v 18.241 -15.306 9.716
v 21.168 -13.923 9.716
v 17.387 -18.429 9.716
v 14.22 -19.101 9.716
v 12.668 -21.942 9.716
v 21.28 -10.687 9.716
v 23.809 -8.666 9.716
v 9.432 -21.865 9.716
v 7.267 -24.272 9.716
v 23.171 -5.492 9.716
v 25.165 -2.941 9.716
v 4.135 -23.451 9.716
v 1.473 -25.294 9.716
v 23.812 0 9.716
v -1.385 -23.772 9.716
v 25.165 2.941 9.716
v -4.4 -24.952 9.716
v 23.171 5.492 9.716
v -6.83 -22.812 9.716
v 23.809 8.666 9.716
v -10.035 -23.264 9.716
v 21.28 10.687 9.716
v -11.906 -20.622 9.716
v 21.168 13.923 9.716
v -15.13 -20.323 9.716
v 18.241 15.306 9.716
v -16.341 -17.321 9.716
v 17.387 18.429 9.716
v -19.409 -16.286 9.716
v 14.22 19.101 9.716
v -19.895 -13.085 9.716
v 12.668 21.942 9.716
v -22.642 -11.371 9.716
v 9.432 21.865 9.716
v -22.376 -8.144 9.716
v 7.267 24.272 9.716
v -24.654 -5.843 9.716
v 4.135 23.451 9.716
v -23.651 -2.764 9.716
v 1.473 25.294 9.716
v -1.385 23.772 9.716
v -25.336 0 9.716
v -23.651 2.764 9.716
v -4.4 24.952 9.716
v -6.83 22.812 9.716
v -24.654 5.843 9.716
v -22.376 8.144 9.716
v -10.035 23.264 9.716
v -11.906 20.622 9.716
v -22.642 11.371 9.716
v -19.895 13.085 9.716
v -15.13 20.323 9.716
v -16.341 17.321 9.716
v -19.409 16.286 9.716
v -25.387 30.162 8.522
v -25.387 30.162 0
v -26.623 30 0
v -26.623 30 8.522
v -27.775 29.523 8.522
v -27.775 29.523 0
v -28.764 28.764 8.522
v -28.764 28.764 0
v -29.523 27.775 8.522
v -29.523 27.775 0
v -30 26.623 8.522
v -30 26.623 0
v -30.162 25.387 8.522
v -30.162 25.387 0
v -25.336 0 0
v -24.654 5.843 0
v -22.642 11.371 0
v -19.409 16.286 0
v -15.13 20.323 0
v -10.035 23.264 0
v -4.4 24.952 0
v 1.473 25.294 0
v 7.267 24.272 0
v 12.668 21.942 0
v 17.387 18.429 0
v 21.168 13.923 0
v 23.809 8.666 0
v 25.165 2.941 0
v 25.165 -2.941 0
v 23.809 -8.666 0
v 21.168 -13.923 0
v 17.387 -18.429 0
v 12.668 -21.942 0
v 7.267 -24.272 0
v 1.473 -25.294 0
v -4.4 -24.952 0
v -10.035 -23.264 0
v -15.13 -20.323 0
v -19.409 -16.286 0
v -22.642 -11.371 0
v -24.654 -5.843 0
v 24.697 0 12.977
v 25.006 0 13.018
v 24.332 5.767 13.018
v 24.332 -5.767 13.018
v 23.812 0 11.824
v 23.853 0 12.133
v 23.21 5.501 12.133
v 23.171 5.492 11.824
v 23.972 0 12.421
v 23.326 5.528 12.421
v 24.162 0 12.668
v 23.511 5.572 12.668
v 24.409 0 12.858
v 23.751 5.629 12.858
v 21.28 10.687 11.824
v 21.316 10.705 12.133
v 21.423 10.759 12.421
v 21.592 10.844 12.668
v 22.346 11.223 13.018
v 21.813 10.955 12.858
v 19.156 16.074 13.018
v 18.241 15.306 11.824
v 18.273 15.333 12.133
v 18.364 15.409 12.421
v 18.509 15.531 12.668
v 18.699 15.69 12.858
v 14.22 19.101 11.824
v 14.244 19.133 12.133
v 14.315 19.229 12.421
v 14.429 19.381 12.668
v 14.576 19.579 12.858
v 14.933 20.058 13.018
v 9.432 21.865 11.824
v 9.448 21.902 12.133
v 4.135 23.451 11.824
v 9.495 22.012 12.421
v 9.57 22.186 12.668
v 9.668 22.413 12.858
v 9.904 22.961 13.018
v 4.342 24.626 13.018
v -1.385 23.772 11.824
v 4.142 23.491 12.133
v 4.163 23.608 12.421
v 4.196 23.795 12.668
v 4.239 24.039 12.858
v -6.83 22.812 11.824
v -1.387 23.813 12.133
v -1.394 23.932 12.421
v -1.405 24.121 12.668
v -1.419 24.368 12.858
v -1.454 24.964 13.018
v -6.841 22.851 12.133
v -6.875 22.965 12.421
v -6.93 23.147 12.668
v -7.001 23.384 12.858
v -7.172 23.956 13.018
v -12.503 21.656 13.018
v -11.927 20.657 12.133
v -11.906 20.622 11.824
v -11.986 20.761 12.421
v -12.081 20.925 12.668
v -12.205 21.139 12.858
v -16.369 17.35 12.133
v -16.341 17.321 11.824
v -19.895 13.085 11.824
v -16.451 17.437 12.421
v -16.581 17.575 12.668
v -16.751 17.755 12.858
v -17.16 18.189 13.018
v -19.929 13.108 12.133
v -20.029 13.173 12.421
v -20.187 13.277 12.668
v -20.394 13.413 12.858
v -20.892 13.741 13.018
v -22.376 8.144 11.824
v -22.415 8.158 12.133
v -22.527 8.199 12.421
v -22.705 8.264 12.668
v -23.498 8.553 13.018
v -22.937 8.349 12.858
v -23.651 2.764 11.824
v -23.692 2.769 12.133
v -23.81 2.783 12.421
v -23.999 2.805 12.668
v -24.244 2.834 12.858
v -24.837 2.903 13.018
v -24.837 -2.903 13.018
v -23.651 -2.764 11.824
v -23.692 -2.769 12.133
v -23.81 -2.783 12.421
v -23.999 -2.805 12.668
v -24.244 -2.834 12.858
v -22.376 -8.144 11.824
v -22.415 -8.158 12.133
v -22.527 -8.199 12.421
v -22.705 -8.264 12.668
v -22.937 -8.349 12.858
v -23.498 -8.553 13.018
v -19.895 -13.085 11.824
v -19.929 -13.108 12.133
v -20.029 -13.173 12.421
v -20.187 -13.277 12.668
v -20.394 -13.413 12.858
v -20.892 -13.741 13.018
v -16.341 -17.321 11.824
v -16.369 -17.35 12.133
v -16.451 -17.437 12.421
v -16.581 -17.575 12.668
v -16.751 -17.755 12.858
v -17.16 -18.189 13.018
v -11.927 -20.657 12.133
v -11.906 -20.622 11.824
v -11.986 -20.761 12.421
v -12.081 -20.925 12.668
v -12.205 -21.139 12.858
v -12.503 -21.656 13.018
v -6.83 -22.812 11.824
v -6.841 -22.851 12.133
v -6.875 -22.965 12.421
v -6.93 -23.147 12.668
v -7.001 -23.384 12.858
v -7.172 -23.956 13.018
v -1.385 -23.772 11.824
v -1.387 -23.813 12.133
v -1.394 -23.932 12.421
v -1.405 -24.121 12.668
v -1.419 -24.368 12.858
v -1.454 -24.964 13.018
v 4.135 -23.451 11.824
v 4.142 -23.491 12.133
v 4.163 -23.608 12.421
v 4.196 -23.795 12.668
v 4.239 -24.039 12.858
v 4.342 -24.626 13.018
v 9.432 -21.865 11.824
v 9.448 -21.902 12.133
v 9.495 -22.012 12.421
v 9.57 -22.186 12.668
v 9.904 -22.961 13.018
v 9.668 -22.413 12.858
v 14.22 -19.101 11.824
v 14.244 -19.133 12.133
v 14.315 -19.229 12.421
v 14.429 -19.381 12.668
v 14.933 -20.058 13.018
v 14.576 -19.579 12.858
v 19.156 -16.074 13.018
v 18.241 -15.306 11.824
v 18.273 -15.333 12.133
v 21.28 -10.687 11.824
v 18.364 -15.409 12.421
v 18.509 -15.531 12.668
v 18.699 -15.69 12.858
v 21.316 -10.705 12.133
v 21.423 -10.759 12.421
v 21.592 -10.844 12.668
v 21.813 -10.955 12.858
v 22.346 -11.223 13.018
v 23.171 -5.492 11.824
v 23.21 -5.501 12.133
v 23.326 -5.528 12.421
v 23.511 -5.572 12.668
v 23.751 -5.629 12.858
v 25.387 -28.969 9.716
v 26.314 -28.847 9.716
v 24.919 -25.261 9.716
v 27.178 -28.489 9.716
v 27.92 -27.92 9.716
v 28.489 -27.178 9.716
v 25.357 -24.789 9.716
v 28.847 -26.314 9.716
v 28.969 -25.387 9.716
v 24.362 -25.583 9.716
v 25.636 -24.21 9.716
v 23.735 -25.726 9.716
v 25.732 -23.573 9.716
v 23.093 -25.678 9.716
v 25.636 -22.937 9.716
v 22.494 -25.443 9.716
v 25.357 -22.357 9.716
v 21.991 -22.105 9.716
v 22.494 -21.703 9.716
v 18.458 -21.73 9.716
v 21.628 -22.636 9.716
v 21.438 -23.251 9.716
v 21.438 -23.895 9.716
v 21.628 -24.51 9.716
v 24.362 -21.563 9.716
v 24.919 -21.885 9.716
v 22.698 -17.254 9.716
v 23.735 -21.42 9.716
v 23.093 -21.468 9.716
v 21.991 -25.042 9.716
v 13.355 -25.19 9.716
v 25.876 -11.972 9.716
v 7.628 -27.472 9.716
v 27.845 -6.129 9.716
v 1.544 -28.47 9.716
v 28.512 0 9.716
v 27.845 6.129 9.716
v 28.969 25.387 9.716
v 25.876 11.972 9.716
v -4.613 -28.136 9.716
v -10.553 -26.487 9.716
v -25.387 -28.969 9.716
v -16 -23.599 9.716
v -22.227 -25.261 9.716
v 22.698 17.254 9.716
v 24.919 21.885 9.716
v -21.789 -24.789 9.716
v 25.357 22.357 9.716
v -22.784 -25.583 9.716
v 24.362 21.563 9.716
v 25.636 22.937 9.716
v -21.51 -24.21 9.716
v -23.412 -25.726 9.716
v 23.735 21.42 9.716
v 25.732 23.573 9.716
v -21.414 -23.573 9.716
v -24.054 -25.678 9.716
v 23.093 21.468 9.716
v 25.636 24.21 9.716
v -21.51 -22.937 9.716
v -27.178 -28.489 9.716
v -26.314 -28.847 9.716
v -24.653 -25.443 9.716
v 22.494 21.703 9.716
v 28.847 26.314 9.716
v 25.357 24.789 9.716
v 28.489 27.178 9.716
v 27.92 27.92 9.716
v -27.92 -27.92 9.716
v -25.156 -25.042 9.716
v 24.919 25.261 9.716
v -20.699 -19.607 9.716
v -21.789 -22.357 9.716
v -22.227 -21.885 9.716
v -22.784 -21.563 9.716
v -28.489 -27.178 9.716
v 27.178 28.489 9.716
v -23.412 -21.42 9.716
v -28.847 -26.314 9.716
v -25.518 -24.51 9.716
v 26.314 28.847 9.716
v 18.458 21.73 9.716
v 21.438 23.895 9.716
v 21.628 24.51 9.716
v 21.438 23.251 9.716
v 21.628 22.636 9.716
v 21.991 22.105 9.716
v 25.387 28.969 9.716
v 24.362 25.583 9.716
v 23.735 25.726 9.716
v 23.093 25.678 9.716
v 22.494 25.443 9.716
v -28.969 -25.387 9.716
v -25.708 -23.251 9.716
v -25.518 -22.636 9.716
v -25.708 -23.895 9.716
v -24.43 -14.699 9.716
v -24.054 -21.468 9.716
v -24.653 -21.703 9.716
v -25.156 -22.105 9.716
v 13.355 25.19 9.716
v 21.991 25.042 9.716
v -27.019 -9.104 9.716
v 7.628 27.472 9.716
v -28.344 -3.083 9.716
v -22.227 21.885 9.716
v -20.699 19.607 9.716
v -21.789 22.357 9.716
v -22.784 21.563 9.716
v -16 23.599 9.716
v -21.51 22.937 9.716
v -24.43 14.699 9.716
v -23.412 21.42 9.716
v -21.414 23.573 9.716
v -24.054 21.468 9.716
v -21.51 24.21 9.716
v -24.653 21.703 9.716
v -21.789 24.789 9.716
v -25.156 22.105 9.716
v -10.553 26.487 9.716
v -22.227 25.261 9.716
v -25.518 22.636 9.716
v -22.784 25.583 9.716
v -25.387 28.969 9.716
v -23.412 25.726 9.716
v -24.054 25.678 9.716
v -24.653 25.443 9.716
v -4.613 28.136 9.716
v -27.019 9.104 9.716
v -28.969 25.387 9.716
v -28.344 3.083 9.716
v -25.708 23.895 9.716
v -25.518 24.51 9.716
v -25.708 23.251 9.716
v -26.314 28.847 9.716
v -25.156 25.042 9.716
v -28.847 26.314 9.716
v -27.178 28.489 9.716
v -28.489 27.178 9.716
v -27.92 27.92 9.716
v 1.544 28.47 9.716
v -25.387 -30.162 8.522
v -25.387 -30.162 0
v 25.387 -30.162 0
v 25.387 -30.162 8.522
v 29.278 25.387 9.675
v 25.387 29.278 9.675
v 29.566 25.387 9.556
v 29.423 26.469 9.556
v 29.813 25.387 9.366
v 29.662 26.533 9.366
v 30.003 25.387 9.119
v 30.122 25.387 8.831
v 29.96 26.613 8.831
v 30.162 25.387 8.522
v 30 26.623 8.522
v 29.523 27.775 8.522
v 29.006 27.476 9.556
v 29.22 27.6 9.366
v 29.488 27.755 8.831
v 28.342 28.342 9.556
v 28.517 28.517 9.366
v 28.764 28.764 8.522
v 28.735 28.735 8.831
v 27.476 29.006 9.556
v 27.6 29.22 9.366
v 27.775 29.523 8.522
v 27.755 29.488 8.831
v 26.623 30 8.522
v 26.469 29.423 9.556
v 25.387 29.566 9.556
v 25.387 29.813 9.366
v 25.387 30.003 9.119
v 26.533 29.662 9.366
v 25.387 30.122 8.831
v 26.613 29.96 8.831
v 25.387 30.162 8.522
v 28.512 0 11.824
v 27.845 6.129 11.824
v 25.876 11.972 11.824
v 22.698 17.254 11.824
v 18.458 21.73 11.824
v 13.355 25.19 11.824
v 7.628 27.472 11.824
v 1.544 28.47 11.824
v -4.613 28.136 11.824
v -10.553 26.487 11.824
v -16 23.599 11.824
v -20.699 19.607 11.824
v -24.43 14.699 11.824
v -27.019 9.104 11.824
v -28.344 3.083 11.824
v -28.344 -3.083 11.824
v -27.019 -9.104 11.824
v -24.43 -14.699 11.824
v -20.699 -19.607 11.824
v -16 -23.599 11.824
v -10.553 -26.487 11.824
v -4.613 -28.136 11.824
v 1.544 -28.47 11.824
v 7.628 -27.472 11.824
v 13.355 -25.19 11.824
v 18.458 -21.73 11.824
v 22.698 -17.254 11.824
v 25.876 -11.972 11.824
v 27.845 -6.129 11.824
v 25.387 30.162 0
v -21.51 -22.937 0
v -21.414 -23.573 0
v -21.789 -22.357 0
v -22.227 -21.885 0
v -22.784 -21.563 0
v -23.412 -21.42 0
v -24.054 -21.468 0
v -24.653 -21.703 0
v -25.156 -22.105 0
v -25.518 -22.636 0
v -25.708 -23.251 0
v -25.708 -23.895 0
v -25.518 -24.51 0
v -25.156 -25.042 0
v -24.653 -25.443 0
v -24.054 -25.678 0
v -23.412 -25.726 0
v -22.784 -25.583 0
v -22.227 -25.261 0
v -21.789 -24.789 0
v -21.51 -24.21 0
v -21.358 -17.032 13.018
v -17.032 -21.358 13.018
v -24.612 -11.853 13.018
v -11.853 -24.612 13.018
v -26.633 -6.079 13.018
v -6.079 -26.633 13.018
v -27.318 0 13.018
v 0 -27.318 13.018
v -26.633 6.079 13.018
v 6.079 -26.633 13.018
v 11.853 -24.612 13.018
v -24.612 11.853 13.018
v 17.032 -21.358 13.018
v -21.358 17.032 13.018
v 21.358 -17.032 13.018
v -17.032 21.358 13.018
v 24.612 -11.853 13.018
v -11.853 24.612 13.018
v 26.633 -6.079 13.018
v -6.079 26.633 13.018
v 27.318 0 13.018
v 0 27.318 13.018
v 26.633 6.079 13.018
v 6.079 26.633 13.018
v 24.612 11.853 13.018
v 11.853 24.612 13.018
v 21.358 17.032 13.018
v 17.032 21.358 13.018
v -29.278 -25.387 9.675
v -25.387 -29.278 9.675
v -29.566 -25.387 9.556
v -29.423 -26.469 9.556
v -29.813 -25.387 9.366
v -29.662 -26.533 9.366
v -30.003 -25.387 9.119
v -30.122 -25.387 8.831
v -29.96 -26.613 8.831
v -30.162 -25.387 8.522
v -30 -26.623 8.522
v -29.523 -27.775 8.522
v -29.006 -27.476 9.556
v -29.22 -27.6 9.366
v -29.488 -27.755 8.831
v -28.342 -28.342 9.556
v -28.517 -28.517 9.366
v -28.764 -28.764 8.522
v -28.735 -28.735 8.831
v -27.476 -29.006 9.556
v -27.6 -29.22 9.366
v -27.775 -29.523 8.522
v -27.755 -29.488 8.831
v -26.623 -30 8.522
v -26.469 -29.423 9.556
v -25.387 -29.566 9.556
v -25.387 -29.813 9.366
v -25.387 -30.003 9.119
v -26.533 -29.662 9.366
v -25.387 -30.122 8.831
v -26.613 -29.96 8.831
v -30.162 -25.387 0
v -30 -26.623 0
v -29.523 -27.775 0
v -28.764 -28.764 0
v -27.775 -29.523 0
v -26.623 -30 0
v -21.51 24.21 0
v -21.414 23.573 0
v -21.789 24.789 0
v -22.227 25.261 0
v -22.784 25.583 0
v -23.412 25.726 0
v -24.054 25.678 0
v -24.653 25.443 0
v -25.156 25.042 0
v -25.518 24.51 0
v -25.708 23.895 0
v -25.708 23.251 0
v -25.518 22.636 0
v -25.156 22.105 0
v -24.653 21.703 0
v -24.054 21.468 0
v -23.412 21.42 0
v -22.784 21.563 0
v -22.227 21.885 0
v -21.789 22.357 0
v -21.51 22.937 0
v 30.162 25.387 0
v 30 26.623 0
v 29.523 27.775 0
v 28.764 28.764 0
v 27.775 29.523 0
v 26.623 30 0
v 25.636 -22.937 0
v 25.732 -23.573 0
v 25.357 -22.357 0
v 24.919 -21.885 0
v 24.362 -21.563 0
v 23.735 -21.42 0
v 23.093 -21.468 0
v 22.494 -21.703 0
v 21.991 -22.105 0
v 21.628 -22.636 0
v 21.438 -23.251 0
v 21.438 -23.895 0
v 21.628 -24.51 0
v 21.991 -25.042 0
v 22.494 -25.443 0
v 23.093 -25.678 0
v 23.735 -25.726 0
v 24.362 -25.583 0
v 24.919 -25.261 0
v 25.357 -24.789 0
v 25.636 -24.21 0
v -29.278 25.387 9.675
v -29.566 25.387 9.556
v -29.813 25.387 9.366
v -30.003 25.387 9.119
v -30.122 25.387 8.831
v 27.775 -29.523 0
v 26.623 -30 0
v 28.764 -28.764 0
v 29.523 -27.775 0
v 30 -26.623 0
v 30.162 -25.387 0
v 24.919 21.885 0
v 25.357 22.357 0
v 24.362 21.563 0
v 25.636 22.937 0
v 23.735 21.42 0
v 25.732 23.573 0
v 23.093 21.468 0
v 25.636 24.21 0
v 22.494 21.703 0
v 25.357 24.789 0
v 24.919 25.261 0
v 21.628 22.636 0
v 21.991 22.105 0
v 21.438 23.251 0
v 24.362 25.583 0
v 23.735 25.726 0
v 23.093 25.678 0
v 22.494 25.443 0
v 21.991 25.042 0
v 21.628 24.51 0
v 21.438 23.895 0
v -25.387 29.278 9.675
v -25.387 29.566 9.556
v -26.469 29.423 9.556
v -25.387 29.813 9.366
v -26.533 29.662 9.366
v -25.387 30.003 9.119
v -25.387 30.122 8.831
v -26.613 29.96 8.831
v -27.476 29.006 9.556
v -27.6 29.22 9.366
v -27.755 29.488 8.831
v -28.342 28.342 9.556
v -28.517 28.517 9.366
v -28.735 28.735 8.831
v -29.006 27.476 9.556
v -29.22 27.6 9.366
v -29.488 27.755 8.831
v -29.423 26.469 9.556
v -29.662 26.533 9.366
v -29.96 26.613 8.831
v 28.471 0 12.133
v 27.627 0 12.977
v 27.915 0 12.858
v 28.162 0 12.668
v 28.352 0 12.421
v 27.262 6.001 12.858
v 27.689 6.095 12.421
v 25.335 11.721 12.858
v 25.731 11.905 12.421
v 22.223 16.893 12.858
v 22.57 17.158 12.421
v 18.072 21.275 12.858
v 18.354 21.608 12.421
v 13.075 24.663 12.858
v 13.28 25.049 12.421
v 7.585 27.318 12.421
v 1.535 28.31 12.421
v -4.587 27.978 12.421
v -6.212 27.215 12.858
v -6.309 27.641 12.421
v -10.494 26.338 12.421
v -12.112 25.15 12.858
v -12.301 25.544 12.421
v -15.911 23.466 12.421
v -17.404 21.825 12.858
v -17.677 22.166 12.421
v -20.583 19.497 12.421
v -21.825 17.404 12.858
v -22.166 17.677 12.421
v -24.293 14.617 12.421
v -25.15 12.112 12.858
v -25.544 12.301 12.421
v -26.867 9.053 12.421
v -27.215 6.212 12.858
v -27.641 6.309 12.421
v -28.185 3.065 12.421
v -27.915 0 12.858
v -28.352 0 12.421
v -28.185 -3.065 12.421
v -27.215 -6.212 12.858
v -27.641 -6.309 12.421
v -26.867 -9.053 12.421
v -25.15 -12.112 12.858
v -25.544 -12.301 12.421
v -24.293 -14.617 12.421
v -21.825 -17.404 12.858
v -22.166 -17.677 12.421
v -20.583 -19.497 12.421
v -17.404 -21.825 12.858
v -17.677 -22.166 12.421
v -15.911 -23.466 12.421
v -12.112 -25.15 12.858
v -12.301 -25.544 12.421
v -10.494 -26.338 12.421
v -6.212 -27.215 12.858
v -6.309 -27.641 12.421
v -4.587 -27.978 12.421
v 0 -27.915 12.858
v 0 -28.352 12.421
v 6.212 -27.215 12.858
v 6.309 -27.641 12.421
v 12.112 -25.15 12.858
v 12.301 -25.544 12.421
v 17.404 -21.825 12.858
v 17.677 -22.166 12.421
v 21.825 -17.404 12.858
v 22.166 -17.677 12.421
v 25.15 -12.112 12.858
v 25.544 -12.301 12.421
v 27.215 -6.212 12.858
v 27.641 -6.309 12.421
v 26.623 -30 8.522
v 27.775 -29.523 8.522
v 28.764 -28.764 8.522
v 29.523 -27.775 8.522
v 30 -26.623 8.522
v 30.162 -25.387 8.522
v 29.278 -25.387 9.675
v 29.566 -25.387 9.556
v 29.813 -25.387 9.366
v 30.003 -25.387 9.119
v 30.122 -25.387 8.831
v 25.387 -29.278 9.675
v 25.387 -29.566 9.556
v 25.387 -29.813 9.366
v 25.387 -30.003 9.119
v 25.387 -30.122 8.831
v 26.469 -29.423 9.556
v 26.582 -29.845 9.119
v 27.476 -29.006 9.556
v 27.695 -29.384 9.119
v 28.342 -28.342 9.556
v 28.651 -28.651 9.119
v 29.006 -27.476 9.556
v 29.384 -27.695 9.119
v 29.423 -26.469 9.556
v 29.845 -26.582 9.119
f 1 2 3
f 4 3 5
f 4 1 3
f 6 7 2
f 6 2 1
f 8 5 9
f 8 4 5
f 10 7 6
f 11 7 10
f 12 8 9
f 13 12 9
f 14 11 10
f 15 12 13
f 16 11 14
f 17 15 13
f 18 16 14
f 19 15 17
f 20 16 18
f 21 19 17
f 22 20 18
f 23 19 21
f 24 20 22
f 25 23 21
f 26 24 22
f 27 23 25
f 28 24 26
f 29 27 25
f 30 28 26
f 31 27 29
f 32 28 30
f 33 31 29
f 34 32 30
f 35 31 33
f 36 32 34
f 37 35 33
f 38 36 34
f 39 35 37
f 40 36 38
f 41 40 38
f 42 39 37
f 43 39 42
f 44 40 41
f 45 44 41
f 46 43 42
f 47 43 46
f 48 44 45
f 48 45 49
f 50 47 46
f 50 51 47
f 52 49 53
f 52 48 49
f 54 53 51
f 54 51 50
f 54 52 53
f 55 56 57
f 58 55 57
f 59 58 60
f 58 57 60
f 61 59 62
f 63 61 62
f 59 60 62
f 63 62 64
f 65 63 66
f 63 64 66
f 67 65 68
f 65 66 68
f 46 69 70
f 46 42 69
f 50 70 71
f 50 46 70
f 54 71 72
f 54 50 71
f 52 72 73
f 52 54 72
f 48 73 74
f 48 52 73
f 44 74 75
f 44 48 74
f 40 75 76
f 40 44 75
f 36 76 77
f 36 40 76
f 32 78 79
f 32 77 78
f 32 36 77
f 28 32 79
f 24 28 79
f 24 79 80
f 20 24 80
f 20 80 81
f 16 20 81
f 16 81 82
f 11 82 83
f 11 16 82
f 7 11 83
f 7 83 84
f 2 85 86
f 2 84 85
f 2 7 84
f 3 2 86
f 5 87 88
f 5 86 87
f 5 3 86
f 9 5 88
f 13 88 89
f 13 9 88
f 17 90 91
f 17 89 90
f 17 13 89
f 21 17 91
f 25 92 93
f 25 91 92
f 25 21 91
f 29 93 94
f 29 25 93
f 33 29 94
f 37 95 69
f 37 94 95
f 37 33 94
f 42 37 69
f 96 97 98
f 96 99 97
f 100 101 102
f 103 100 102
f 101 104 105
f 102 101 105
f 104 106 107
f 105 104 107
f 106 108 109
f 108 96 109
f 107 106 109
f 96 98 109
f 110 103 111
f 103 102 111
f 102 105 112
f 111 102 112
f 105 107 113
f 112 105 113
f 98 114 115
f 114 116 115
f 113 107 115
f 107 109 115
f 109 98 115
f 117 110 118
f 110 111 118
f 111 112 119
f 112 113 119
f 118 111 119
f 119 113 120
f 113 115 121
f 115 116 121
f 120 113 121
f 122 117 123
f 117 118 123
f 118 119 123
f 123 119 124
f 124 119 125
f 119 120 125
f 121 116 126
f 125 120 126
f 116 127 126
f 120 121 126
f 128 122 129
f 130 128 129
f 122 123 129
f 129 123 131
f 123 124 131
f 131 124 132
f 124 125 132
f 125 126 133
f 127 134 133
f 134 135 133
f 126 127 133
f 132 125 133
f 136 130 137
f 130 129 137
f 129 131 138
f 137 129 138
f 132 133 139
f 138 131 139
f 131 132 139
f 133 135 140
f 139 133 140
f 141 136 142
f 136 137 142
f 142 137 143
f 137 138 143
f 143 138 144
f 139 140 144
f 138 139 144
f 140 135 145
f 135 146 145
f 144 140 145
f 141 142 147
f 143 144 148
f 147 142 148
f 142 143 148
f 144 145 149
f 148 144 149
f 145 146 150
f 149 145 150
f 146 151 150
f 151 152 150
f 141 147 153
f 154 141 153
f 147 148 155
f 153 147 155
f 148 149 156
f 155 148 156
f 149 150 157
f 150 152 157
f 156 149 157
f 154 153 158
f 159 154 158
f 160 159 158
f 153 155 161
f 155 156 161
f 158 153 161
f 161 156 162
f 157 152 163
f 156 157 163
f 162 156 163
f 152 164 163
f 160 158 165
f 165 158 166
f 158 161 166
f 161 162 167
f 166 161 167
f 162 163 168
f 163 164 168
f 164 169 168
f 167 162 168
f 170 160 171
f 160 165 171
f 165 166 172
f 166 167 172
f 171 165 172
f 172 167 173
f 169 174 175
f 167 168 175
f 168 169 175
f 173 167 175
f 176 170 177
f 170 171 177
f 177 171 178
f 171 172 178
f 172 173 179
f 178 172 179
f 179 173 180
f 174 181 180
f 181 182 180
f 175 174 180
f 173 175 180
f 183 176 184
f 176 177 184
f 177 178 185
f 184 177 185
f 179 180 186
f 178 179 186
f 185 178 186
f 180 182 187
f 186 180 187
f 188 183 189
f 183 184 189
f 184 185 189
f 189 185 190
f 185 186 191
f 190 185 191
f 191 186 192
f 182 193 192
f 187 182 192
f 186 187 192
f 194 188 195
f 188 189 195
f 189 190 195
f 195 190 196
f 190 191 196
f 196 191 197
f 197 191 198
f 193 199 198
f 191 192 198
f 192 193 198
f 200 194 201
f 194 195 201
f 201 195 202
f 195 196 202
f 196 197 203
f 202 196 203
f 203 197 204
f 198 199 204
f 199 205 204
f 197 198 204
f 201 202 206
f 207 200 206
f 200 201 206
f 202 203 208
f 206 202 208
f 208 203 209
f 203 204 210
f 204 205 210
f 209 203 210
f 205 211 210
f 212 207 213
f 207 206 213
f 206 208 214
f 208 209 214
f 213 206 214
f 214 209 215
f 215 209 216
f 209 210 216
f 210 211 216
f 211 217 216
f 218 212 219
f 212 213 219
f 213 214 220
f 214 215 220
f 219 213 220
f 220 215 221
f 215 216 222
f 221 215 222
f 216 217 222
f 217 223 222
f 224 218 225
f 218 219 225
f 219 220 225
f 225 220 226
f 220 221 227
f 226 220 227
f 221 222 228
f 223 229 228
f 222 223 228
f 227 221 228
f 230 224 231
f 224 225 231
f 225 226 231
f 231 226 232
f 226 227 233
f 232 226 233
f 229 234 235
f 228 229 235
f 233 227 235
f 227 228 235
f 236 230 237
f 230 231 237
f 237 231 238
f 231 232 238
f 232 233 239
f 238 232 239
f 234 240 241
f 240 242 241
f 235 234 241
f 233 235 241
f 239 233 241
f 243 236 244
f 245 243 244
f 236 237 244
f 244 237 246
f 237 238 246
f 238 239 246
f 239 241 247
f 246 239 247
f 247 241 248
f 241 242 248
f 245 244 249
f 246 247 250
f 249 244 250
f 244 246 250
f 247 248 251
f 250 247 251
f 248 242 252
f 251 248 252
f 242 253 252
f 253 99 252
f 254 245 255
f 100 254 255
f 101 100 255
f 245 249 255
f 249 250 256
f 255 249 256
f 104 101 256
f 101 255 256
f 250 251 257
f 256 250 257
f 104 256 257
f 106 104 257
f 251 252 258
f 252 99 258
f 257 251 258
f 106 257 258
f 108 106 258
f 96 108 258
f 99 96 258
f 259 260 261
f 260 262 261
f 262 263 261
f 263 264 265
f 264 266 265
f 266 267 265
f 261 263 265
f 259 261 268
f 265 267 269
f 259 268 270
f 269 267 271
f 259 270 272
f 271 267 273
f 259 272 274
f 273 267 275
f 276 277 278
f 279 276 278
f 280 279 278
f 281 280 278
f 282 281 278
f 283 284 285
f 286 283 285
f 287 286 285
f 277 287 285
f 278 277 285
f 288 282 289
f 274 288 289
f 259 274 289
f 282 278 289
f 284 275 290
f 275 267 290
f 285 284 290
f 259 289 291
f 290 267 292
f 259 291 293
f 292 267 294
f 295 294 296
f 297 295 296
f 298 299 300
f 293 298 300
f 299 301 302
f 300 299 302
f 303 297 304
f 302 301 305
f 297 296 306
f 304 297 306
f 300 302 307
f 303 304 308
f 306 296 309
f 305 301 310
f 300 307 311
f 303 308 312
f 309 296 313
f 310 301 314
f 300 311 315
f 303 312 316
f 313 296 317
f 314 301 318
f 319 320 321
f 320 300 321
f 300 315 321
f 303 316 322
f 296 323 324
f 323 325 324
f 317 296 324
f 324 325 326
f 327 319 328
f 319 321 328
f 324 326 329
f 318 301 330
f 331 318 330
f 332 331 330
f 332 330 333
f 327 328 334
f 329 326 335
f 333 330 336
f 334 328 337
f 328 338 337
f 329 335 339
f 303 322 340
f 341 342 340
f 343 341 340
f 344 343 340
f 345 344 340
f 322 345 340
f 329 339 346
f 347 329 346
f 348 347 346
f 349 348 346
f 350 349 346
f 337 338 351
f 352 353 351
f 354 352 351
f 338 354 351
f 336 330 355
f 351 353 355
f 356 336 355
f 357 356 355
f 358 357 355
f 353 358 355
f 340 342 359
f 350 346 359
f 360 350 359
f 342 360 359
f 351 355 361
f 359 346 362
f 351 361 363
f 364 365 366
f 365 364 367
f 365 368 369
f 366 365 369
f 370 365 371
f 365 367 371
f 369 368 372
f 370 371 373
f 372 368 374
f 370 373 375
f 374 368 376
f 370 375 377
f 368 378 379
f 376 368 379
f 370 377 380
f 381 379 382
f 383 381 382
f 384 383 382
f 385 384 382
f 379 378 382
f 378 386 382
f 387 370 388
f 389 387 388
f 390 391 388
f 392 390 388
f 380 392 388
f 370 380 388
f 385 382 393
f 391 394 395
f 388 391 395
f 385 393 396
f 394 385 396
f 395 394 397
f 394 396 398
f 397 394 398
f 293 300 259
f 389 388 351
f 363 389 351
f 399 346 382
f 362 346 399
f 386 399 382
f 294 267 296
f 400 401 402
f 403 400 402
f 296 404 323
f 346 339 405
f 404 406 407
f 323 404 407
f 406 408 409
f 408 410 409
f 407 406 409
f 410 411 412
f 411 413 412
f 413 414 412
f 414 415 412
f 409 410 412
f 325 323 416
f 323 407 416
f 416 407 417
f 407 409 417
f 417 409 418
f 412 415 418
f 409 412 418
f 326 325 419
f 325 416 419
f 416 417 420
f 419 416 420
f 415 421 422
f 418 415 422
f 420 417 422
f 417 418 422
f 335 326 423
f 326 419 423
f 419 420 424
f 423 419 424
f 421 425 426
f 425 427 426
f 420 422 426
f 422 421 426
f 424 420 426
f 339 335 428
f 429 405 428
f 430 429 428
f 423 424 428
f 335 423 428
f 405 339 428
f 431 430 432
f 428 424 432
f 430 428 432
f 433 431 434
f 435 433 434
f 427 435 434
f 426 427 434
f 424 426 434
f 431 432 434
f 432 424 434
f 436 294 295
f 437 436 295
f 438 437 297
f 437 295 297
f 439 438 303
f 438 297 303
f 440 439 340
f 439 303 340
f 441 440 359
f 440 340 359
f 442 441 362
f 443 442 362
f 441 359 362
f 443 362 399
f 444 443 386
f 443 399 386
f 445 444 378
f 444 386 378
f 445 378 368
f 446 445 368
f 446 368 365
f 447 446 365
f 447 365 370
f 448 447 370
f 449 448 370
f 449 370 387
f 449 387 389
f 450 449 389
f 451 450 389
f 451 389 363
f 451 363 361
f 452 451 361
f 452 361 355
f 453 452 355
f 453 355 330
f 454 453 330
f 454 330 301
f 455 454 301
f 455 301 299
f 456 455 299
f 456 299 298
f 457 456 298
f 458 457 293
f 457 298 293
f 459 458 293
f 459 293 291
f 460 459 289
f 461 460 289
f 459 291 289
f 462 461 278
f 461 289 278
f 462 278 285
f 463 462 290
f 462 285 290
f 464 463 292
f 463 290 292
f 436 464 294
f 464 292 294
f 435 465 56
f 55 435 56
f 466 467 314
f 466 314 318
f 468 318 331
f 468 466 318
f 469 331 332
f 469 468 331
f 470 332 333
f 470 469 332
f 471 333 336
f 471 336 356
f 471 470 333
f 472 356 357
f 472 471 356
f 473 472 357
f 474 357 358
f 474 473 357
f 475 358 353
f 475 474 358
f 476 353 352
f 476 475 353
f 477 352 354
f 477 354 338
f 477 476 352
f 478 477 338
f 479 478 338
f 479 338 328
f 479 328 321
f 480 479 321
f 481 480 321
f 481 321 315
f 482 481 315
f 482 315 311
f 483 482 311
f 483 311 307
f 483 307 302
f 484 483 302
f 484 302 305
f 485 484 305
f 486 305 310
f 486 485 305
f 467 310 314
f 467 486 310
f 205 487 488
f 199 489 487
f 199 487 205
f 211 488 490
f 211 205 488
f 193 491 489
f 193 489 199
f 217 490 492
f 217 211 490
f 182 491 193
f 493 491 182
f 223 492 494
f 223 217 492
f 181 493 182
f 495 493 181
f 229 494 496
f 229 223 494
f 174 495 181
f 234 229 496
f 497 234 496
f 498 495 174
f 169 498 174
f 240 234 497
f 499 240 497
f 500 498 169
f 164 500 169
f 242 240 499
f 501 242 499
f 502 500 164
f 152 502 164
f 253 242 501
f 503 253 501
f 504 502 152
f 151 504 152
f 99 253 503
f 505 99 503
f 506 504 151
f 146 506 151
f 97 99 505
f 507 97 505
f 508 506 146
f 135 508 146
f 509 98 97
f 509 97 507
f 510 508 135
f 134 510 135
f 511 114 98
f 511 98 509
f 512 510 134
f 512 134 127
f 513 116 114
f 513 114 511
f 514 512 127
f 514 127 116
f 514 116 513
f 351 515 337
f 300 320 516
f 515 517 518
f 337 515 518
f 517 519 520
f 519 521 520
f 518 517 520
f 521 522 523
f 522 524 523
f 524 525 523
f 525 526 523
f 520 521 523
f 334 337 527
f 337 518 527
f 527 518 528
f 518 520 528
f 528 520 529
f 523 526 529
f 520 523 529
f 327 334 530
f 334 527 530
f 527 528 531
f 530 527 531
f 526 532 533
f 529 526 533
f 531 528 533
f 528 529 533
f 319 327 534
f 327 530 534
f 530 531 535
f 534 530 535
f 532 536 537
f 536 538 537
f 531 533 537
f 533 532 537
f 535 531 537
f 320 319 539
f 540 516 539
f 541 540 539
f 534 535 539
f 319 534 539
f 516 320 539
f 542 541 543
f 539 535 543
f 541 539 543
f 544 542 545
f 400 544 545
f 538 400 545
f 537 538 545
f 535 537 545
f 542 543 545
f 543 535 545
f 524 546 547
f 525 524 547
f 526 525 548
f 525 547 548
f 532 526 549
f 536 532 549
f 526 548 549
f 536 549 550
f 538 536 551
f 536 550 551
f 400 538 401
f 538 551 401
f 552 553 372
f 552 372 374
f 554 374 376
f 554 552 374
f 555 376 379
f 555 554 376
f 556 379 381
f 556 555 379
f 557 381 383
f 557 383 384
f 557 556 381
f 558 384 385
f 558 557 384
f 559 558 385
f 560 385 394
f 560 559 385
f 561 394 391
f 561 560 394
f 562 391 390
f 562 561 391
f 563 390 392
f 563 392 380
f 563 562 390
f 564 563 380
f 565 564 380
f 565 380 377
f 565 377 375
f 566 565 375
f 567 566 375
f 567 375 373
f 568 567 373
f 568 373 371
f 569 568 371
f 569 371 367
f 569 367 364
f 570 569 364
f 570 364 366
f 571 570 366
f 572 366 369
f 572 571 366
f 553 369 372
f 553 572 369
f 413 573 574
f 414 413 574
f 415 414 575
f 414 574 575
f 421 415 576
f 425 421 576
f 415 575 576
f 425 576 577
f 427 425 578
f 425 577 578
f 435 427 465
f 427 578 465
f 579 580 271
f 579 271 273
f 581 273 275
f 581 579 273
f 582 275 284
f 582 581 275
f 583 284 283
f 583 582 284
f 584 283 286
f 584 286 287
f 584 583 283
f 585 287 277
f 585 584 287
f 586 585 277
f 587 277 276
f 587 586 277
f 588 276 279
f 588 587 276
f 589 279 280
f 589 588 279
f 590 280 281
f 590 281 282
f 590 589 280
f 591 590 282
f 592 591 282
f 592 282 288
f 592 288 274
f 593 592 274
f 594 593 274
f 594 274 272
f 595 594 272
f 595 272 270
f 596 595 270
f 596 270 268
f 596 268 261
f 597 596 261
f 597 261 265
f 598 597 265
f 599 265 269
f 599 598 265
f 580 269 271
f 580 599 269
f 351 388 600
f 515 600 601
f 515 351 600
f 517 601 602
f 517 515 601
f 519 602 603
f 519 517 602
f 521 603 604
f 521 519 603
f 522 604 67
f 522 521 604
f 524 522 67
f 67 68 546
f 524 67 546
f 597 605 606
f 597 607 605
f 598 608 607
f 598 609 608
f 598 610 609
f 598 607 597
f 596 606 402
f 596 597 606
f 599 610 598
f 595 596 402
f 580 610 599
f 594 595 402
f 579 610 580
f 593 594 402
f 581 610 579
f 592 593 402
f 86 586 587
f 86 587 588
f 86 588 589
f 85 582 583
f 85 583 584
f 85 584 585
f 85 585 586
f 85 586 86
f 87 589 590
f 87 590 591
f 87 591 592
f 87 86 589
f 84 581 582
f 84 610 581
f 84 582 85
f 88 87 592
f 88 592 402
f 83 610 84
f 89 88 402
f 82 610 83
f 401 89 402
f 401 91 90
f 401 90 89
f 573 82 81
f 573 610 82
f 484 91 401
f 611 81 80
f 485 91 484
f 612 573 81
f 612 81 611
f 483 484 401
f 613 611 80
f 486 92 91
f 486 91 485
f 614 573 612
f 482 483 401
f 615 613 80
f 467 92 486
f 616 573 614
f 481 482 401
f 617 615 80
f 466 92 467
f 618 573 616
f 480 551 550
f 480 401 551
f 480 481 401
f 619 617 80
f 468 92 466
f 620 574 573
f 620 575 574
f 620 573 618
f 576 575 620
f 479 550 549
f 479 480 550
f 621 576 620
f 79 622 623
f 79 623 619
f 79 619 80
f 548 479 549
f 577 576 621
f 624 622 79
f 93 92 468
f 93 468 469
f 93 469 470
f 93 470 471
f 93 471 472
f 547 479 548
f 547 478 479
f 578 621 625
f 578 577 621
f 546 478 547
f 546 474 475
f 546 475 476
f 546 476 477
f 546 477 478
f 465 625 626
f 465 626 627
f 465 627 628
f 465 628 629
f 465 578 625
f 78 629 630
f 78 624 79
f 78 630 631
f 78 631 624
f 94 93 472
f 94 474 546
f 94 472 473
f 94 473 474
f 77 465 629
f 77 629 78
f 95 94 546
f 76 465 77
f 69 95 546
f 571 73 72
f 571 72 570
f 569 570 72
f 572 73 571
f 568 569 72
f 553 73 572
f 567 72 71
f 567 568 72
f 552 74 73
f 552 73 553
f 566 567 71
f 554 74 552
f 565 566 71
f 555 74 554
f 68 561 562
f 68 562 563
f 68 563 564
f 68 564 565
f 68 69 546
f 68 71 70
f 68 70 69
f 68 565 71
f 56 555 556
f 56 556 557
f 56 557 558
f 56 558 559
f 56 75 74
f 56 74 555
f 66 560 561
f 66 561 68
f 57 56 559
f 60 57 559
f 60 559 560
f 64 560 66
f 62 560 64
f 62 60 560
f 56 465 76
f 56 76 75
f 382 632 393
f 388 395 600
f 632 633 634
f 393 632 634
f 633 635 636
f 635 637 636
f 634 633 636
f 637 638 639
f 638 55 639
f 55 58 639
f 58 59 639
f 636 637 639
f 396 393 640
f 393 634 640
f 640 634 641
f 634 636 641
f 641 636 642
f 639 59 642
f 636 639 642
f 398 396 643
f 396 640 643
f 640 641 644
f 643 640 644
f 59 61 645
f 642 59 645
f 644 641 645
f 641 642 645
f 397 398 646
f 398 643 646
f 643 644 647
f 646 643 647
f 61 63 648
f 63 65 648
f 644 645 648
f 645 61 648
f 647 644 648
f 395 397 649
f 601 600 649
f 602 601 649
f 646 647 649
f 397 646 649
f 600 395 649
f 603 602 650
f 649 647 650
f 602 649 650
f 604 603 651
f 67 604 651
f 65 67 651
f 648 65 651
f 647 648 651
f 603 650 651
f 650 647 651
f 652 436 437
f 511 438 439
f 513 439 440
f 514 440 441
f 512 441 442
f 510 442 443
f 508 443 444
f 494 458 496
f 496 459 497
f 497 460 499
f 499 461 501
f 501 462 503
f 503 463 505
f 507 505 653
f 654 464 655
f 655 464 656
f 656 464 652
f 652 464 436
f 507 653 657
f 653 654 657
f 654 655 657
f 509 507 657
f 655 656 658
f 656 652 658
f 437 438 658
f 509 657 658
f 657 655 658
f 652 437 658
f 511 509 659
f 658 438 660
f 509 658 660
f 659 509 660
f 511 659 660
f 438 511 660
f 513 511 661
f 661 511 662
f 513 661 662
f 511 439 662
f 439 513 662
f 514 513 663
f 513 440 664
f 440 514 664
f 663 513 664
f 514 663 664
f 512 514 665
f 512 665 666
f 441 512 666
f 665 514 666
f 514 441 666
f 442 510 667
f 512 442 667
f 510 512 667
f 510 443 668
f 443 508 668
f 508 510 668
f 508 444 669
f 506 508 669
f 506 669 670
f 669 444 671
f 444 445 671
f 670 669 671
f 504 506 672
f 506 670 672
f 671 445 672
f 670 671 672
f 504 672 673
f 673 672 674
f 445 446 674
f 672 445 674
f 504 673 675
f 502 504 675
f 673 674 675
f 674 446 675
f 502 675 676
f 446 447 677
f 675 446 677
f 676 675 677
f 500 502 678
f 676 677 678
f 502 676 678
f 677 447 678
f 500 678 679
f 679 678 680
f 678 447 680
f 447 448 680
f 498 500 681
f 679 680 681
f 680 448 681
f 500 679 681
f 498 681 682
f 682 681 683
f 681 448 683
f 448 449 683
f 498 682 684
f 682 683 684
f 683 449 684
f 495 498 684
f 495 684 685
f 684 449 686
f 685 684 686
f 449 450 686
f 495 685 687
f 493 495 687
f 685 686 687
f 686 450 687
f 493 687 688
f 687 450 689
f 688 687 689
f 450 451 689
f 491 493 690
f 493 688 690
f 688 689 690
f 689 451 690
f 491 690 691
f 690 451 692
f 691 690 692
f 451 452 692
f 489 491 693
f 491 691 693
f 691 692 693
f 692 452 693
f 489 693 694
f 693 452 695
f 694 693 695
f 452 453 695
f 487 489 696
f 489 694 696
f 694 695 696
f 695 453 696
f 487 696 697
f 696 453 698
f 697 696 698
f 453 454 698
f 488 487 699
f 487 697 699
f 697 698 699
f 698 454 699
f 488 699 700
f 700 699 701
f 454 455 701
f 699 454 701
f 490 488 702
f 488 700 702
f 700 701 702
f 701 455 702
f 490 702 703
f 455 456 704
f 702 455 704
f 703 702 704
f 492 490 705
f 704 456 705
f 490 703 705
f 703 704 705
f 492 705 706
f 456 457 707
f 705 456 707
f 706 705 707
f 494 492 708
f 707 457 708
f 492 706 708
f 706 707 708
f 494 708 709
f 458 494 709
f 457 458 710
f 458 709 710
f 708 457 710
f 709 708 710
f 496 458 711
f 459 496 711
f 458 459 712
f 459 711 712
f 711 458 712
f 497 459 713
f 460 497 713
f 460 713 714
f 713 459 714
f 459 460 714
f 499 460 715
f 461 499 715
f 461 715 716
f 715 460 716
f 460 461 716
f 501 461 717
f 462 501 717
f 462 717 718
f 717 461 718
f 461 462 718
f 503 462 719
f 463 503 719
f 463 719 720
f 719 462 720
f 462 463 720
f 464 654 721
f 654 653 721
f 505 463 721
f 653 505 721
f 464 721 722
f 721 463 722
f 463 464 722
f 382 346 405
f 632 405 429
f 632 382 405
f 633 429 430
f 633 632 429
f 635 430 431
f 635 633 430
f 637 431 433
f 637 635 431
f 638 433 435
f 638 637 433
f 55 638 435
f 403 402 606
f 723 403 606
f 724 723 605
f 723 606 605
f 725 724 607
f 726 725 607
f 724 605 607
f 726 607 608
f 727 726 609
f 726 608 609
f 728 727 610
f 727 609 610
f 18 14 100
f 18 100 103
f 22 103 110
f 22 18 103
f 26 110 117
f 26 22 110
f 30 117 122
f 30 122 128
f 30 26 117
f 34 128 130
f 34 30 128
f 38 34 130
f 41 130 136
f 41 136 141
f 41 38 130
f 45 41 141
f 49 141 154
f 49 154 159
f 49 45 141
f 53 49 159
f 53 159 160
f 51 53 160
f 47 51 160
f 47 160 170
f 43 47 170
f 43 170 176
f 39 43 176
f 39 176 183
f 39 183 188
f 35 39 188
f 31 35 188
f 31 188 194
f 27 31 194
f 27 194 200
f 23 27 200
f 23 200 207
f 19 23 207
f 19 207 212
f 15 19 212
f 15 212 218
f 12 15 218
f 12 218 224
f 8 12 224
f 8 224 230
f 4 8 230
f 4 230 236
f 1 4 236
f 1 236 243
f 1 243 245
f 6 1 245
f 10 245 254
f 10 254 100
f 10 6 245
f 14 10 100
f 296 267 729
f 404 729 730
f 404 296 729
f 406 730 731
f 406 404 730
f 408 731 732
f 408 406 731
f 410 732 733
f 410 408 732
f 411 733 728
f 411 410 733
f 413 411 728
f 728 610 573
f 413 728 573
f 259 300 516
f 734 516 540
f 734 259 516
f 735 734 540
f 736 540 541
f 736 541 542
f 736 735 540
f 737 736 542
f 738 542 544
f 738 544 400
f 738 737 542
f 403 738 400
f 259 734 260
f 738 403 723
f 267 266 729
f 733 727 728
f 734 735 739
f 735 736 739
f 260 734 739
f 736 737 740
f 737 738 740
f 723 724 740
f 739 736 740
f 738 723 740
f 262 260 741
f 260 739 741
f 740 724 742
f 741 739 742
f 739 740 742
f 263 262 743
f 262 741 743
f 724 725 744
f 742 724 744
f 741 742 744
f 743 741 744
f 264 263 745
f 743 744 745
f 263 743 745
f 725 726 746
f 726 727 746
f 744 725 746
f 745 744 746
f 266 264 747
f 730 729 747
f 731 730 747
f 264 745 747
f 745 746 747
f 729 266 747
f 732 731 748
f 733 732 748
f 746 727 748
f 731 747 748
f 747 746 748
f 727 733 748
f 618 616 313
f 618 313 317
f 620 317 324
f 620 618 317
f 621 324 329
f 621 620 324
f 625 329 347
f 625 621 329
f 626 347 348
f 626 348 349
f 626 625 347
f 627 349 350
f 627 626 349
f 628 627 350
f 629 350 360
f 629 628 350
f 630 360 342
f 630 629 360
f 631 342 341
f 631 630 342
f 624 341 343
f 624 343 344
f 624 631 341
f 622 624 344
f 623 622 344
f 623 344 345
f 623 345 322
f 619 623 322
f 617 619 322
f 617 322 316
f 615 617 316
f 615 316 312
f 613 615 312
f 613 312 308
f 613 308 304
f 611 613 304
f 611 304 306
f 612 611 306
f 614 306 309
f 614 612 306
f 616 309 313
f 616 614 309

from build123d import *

# Parameters (mm, degrees)
SKETCH1_R               = 2.159
SKETCH1_R_2             = 28.5115
BOSS_EXTRUDE1_DEPTH     = 9.7155
SKETCH1_3_R             = 28.5115
SKETCH1_3_R_2           = 23.8125
EXTENDED_BEZEL_DEPTH    = 13.0175
SKETCH1_5_R             = 28.5115
SKETCH1_5_R_2           = 23.8125
BOSS_EXTRUDE4_DEPTH     = 6.35
SKETCH2_R               = 25.3365
CUT_EXTRUDE1_DEPTH      = 7.35
CUT_EXTRUDE1_DEPTH_BACK = 9.7155
FILLET1_R               = 1.1938
SKETCH3_R               = 28.5115
CUT_EXTRUDE2_DEPTH      = 7.35


with BuildPart() as part:
    # Sketch1 → Boss-Extrude1 (new body)
    with BuildSketch(Plane.XY):
        with BuildLine():
            ThreePointArc((-24.49722379, -28.024879905), (-26.788104009, -26.788104009), (-28.024879905, -24.49722379))
            Line((-28.024879905, -24.49722379), (-30.1625, -14.199031657))
            Line((-30.1625, -14.199031657), (-30.1625, 14.199031657))
            Line((-30.1625, 14.199031657), (-28.024879905, 24.49722379))
            ThreePointArc((-28.024879905, 24.49722379), (-26.788104009, 26.788104009), (-24.49722379, 28.024879905))
            Line((-24.49722379, 28.024879905), (-14.199031657, 30.1625))
            Line((-14.199031657, 30.1625), (14.199031657, 30.1625))
            Line((14.199031657, 30.1625), (24.441349319, 28.268787691))
            ThreePointArc((24.441349319, 28.268787691), (26.949748619, 26.949748619), (28.268787691, 24.441349319))
            Line((28.268787691, 24.441349319), (30.1625, 14.199031657))
            Line((30.1625, 14.199031657), (30.1625, -14.199031657))
            Line((30.1625, -14.199031657), (28.024879905, -24.49722379))
            ThreePointArc((28.024879905, -24.49722379), (26.788104009, -26.788104009), (24.49722379, -28.024879905))
            Line((24.49722379, -28.024879905), (14.199031657, -30.1625))
            Line((14.199031657, -30.1625), (-14.199031657, -30.1625))
            Line((-14.199031657, -30.1625), (-24.49722379, -28.024879905))
        make_face()
        with Locations((-23.573172318, -23.573172318)):
            Circle(SKETCH1_R, mode=Mode.SUBTRACT)
        with Locations((23.573172318, -23.573172318)):
            Circle(SKETCH1_R, mode=Mode.SUBTRACT)
        with Locations((23.573172318, 23.573172318)):
            Circle(SKETCH1_R, mode=Mode.SUBTRACT)
        with Locations((-23.573172318, 23.573172318)):
            Circle(SKETCH1_R, mode=Mode.SUBTRACT)
        Circle(SKETCH1_R_2, mode=Mode.SUBTRACT)
        with BuildLine():
            Line((28.268787691, 24.441349319), (30.1625, 14.199031657))
            Line((30.1625, 14.199031657), (30.1625, 25.3873))
            ThreePointArc((30.1625, 25.3873), (28.763876302, 28.763876302), (25.3873, 30.1625))
            Line((25.3873, 30.1625), (14.199031657, 30.1625))
            Line((14.199031657, 30.1625), (24.441349319, 28.268787691))
            ThreePointArc((24.441349319, 28.268787691), (26.949748619, 26.949748619), (28.268787691, 24.441349319))
        make_face()
        with BuildLine():
            Line((-30.1625, 25.3873), (-30.1625, 14.199031657))
            Line((-30.1625, 14.199031657), (-28.024879905, 24.49722379))
            ThreePointArc((-28.024879905, 24.49722379), (-26.788104009, 26.788104009), (-24.49722379, 28.024879905))
            Line((-24.49722379, 28.024879905), (-14.199031657, 30.1625))
            Line((-14.199031657, 30.1625), (-25.3873, 30.1625))
            ThreePointArc((-25.3873, 30.1625), (-28.763876302, 28.763876302), (-30.1625, 25.3873))
        make_face()
        with BuildLine():
            Line((-25.3873, -30.1625), (-14.199031657, -30.1625))
            Line((-14.199031657, -30.1625), (-24.49722379, -28.024879905))
            ThreePointArc((-24.49722379, -28.024879905), (-26.788104009, -26.788104009), (-28.024879905, -24.49722379))
            Line((-28.024879905, -24.49722379), (-30.1625, -14.199031657))
            Line((-30.1625, -14.199031657), (-30.1625, -25.3873))
            ThreePointArc((-30.1625, -25.3873), (-28.763876302, -28.763876302), (-25.3873, -30.1625))
        make_face()
        with BuildLine():
            Line((24.49722379, -28.024879905), (14.199031657, -30.1625))
            Line((14.199031657, -30.1625), (25.3873, -30.1625))
            ThreePointArc((25.3873, -30.1625), (28.763876302, -28.763876302), (30.1625, -25.3873))
            Line((30.1625, -25.3873), (30.1625, -14.199031657))
            Line((30.1625, -14.199031657), (28.024879905, -24.49722379))
            ThreePointArc((28.024879905, -24.49722379), (26.788104009, -26.788104009), (24.49722379, -28.024879905))
        make_face()
    extrude(amount=BOSS_EXTRUDE1_DEPTH)

    # Sketch1_3 → Extended Bezel (add)
    with BuildSketch(Plane.XY):
        Circle(SKETCH1_3_R)
        Circle(SKETCH1_3_R_2, mode=Mode.SUBTRACT)
    extrude(amount=EXTENDED_BEZEL_DEPTH)

    # Sketch1_5 → Boss-Extrude4 (add)
    with BuildSketch(Plane.XY):
        Circle(SKETCH1_5_R)
        Circle(SKETCH1_5_R_2, mode=Mode.SUBTRACT)
    extrude(amount=-BOSS_EXTRUDE4_DEPTH)

    # Sketch2 → Cut-Extrude1 (cut, two sides)
    with BuildSketch(Plane(origin=(0, 0, 0), x_dir=(-1, 0, 0), z_dir=(0, 0, -1))) as cut_extrude1_sk:
        Circle(SKETCH2_R)
    extrude(amount=CUT_EXTRUDE1_DEPTH, mode=Mode.SUBTRACT)
    extrude(cut_extrude1_sk.sketch, amount=-CUT_EXTRUDE1_DEPTH_BACK, mode=Mode.SUBTRACT)

    # Fillet1
    fillet1_edges = [part.edges().sort_by_distance(p)[0] for p in [
        (28.763876302, -28.763876302, 9.7155),
        (30.1625, 0, 9.7155),
        (28.763876302, 28.763876302, 9.7155),
        (0, 30.1625, 9.7155),
        (-28.763876302, 28.763876302, 9.7155),
        (-30.1625, 0, 9.7155),
        (-23.8125, 0, 13.0175),
        (-28.5115, 0, 13.0175),
        (-28.763876302, -28.763876302, 9.7155),
        (0, -30.1625, 9.7155),
    ]]
    fillet(fillet1_edges, radius=FILLET1_R)

    # Sketch3 → Cut-Extrude2 (cut, through all)
    with BuildSketch(Plane(origin=(0, 0, 0), x_dir=(-1, 0, 0), z_dir=(0, 0, -1))):
        Circle(SKETCH3_R)
    extrude(amount=CUT_EXTRUDE2_DEPTH, mode=Mode.SUBTRACT)


solid = part.part
